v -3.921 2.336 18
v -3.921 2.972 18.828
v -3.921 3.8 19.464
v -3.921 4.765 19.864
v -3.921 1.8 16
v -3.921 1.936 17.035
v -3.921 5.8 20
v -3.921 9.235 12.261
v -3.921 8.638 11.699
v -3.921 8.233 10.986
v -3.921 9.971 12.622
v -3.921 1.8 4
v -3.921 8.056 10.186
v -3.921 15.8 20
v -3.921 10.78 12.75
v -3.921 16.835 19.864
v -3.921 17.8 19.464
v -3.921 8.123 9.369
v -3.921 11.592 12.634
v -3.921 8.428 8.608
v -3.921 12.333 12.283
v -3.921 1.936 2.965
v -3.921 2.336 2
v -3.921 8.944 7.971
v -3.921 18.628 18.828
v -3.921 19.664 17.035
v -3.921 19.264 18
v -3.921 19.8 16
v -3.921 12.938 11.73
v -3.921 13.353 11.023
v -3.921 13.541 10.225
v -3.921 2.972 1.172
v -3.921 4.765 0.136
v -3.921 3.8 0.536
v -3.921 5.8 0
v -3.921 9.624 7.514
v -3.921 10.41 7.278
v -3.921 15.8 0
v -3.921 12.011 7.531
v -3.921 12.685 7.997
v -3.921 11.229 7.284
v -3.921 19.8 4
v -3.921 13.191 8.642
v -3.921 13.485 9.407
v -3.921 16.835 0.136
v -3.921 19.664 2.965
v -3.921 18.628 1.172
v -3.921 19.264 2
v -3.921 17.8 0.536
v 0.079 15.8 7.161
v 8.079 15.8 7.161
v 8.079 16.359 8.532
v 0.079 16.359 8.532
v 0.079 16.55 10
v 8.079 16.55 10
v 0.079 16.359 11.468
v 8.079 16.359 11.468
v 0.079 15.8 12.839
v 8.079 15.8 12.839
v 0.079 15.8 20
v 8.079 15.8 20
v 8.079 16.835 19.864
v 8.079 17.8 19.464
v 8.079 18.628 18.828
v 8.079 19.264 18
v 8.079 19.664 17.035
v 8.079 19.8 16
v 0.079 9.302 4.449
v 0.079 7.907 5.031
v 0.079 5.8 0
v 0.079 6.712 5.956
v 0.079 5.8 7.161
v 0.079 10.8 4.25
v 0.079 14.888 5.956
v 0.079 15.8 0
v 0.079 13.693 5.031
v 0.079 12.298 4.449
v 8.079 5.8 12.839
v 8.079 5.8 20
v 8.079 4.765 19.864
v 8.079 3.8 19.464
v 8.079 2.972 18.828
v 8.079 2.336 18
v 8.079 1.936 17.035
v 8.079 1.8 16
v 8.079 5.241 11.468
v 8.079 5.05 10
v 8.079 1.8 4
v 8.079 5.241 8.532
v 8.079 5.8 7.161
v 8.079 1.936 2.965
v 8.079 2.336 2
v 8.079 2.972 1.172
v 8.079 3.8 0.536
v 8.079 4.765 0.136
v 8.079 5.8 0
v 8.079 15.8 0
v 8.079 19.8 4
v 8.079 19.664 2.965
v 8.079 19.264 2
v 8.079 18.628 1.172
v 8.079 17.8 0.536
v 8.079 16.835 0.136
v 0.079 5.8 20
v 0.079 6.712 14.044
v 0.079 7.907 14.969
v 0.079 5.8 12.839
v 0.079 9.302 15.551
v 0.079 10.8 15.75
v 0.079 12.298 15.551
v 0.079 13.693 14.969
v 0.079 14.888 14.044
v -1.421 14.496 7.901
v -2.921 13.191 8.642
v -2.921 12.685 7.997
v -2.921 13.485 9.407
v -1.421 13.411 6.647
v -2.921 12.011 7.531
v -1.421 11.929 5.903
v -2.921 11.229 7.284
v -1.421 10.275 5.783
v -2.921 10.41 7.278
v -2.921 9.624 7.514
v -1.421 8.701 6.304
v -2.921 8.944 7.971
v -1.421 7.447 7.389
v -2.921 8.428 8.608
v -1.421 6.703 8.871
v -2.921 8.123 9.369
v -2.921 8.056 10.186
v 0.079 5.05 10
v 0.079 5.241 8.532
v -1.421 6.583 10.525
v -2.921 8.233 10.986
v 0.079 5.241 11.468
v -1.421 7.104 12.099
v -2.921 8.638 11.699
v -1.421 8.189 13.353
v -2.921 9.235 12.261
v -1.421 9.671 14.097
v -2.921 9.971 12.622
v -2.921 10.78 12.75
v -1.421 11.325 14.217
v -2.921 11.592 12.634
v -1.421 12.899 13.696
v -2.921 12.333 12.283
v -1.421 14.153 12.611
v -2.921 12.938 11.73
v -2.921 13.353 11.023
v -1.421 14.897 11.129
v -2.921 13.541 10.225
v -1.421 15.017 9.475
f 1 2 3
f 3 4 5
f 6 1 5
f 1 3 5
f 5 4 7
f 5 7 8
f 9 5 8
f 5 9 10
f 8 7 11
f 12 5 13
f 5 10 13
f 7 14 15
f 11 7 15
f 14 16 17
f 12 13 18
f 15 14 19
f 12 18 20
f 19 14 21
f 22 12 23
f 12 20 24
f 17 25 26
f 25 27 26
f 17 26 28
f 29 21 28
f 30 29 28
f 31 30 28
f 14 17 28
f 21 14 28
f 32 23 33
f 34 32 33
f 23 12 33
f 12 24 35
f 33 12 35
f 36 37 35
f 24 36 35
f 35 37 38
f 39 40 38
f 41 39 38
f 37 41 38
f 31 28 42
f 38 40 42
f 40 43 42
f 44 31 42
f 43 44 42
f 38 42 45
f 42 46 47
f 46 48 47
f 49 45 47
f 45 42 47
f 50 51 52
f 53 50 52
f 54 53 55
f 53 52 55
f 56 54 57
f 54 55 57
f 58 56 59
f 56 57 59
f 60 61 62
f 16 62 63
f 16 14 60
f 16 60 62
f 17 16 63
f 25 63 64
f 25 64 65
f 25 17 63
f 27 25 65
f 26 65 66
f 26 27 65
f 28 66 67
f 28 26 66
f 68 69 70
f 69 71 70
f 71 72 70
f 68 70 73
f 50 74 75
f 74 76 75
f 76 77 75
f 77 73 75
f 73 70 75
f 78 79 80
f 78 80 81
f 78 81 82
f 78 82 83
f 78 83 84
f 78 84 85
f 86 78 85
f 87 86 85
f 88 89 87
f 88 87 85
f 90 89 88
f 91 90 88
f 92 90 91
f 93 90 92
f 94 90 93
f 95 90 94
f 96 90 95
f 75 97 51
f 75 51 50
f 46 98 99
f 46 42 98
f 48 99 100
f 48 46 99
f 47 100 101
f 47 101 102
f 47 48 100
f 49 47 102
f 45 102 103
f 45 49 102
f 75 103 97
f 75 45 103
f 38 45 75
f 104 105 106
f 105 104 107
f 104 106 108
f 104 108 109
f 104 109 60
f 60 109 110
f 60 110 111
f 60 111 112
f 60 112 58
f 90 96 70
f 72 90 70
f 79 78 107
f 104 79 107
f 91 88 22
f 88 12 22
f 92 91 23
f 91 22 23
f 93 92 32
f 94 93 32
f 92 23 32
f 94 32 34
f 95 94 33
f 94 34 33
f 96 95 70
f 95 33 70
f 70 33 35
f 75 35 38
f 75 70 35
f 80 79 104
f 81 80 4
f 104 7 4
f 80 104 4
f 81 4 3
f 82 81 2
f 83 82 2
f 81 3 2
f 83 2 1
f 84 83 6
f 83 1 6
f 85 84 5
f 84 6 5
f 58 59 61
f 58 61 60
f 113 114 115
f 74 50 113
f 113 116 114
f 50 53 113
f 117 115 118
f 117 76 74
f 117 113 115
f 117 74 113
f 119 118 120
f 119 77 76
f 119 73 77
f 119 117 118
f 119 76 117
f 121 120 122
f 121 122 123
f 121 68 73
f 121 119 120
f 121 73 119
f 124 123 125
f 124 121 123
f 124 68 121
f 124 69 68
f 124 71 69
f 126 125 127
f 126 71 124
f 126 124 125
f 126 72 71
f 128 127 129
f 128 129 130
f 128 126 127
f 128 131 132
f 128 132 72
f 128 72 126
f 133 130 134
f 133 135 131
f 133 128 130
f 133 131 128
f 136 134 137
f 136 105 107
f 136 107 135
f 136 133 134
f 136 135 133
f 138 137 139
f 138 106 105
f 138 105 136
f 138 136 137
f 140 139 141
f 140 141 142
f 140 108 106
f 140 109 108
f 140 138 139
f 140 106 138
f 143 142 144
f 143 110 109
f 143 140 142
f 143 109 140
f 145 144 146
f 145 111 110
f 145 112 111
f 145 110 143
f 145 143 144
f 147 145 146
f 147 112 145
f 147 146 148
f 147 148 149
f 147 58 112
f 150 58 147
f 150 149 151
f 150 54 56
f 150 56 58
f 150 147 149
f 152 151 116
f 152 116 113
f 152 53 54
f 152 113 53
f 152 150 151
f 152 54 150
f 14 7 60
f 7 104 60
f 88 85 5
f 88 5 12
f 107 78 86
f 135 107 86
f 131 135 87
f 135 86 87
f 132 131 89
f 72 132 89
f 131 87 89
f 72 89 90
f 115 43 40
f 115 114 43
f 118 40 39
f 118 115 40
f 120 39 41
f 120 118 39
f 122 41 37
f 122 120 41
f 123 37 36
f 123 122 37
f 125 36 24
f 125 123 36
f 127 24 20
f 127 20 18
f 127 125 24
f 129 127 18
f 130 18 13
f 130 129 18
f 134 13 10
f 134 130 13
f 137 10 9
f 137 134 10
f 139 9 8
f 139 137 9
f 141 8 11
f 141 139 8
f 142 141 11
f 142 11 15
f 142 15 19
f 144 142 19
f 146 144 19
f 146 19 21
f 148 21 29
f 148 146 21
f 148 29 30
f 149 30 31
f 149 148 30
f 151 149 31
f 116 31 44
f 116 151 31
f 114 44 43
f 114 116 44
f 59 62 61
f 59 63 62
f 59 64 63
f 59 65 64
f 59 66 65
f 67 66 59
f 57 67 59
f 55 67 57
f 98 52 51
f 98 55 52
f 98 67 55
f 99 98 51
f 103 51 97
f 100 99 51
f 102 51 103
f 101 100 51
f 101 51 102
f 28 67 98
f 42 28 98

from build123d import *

# Parameters (mm, degrees)
ESQUISSE1_W             = 20
ESQUISSE1_H             = 18
BOSS_EXTRU_1_DEPTH      = 12
ESQUISSE2_W             = 8
ESQUISSE2_H             = 10
ENL_V_MAT_EXTRU_1_DEPTH = 21
ESQUISSE3_R             = 5.75
ENL_V_MAT_EXTRU_2_DEPTH = 8
CONG_2_R                = 4


with BuildPart() as part:
    # Esquisse1 → Boss.-Extru.1 (new body)
    with BuildSketch(Plane(origin=(8.078830023, 0, 0), x_dir=(0, 0, -1), z_dir=(1, 0, 0))):
        with Locations((-10, 10.8)):
            Rectangle(ESQUISSE1_W, ESQUISSE1_H)
    extrude(amount=-BOSS_EXTRU_1_DEPTH)

    # Esquisse2 → Enlèv. mat.-Extru.1 (cut, through all)
    with BuildSketch(Plane(origin=(0, 0, 0), x_dir=(-1, 0, 0), z_dir=(0, 0, -1))):
        with Locations((-4.078830023, 10.8)):
            Rectangle(ESQUISSE2_W, ESQUISSE2_H)
    extrude(amount=-ENL_V_MAT_EXTRU_1_DEPTH, mode=Mode.SUBTRACT)

    # Esquisse3 → Enlèv. mat.-Extru.2 (cut)
    with BuildSketch(Plane(origin=(8.078830023, 0, 0), x_dir=(0, 0, -1), z_dir=(1, 0, 0))):
        with Locations((-9.999999999, 10.8)):
            Circle(ESQUISSE3_R)
    extrude(amount=-ENL_V_MAT_EXTRU_2_DEPTH, mode=Mode.SUBTRACT)

    # Esquisse5 → Enlèvement de matière-Révolution1 (revolve, cut)
    with BuildSketch(Plane(origin=(0, 0, 10), x_dir=(-1, 0, 0), z_dir=(0, 0, -1)), mode=Mode.PRIVATE) as enl_vement_de_mati_re_r_volution1_sk:
        Polygon((-0.078830023, 16.55), (-0.078830023, 10.8), (3.921169977, 10.8), (3.921169977, 13.55), (2.921169977, 13.55), align=None)
    revolve(enl_vement_de_mati_re_r_volution1_sk.sketch.rotate(Axis((0.078830023, 10.8, 10), (-1, 0, 0)), 29.591845803), axis=Axis((0.078830023, 10.8, 10), (-1, 0, 0)), mode=Mode.SUBTRACT)  # turned: the seam where the file's is

    # Congé2
    cong_2_edges = [part.edges().sort_by_distance(p)[0] for p in [
        (2.078830023, 1.8, 20),
        (2.078830023, 19.8, 0),
        (2.078830023, 1.8, 0),
        (2.078830023, 19.8, 20),
    ]]
    fillet(cong_2_edges, radius=CONG_2_R)


solid = part.part
